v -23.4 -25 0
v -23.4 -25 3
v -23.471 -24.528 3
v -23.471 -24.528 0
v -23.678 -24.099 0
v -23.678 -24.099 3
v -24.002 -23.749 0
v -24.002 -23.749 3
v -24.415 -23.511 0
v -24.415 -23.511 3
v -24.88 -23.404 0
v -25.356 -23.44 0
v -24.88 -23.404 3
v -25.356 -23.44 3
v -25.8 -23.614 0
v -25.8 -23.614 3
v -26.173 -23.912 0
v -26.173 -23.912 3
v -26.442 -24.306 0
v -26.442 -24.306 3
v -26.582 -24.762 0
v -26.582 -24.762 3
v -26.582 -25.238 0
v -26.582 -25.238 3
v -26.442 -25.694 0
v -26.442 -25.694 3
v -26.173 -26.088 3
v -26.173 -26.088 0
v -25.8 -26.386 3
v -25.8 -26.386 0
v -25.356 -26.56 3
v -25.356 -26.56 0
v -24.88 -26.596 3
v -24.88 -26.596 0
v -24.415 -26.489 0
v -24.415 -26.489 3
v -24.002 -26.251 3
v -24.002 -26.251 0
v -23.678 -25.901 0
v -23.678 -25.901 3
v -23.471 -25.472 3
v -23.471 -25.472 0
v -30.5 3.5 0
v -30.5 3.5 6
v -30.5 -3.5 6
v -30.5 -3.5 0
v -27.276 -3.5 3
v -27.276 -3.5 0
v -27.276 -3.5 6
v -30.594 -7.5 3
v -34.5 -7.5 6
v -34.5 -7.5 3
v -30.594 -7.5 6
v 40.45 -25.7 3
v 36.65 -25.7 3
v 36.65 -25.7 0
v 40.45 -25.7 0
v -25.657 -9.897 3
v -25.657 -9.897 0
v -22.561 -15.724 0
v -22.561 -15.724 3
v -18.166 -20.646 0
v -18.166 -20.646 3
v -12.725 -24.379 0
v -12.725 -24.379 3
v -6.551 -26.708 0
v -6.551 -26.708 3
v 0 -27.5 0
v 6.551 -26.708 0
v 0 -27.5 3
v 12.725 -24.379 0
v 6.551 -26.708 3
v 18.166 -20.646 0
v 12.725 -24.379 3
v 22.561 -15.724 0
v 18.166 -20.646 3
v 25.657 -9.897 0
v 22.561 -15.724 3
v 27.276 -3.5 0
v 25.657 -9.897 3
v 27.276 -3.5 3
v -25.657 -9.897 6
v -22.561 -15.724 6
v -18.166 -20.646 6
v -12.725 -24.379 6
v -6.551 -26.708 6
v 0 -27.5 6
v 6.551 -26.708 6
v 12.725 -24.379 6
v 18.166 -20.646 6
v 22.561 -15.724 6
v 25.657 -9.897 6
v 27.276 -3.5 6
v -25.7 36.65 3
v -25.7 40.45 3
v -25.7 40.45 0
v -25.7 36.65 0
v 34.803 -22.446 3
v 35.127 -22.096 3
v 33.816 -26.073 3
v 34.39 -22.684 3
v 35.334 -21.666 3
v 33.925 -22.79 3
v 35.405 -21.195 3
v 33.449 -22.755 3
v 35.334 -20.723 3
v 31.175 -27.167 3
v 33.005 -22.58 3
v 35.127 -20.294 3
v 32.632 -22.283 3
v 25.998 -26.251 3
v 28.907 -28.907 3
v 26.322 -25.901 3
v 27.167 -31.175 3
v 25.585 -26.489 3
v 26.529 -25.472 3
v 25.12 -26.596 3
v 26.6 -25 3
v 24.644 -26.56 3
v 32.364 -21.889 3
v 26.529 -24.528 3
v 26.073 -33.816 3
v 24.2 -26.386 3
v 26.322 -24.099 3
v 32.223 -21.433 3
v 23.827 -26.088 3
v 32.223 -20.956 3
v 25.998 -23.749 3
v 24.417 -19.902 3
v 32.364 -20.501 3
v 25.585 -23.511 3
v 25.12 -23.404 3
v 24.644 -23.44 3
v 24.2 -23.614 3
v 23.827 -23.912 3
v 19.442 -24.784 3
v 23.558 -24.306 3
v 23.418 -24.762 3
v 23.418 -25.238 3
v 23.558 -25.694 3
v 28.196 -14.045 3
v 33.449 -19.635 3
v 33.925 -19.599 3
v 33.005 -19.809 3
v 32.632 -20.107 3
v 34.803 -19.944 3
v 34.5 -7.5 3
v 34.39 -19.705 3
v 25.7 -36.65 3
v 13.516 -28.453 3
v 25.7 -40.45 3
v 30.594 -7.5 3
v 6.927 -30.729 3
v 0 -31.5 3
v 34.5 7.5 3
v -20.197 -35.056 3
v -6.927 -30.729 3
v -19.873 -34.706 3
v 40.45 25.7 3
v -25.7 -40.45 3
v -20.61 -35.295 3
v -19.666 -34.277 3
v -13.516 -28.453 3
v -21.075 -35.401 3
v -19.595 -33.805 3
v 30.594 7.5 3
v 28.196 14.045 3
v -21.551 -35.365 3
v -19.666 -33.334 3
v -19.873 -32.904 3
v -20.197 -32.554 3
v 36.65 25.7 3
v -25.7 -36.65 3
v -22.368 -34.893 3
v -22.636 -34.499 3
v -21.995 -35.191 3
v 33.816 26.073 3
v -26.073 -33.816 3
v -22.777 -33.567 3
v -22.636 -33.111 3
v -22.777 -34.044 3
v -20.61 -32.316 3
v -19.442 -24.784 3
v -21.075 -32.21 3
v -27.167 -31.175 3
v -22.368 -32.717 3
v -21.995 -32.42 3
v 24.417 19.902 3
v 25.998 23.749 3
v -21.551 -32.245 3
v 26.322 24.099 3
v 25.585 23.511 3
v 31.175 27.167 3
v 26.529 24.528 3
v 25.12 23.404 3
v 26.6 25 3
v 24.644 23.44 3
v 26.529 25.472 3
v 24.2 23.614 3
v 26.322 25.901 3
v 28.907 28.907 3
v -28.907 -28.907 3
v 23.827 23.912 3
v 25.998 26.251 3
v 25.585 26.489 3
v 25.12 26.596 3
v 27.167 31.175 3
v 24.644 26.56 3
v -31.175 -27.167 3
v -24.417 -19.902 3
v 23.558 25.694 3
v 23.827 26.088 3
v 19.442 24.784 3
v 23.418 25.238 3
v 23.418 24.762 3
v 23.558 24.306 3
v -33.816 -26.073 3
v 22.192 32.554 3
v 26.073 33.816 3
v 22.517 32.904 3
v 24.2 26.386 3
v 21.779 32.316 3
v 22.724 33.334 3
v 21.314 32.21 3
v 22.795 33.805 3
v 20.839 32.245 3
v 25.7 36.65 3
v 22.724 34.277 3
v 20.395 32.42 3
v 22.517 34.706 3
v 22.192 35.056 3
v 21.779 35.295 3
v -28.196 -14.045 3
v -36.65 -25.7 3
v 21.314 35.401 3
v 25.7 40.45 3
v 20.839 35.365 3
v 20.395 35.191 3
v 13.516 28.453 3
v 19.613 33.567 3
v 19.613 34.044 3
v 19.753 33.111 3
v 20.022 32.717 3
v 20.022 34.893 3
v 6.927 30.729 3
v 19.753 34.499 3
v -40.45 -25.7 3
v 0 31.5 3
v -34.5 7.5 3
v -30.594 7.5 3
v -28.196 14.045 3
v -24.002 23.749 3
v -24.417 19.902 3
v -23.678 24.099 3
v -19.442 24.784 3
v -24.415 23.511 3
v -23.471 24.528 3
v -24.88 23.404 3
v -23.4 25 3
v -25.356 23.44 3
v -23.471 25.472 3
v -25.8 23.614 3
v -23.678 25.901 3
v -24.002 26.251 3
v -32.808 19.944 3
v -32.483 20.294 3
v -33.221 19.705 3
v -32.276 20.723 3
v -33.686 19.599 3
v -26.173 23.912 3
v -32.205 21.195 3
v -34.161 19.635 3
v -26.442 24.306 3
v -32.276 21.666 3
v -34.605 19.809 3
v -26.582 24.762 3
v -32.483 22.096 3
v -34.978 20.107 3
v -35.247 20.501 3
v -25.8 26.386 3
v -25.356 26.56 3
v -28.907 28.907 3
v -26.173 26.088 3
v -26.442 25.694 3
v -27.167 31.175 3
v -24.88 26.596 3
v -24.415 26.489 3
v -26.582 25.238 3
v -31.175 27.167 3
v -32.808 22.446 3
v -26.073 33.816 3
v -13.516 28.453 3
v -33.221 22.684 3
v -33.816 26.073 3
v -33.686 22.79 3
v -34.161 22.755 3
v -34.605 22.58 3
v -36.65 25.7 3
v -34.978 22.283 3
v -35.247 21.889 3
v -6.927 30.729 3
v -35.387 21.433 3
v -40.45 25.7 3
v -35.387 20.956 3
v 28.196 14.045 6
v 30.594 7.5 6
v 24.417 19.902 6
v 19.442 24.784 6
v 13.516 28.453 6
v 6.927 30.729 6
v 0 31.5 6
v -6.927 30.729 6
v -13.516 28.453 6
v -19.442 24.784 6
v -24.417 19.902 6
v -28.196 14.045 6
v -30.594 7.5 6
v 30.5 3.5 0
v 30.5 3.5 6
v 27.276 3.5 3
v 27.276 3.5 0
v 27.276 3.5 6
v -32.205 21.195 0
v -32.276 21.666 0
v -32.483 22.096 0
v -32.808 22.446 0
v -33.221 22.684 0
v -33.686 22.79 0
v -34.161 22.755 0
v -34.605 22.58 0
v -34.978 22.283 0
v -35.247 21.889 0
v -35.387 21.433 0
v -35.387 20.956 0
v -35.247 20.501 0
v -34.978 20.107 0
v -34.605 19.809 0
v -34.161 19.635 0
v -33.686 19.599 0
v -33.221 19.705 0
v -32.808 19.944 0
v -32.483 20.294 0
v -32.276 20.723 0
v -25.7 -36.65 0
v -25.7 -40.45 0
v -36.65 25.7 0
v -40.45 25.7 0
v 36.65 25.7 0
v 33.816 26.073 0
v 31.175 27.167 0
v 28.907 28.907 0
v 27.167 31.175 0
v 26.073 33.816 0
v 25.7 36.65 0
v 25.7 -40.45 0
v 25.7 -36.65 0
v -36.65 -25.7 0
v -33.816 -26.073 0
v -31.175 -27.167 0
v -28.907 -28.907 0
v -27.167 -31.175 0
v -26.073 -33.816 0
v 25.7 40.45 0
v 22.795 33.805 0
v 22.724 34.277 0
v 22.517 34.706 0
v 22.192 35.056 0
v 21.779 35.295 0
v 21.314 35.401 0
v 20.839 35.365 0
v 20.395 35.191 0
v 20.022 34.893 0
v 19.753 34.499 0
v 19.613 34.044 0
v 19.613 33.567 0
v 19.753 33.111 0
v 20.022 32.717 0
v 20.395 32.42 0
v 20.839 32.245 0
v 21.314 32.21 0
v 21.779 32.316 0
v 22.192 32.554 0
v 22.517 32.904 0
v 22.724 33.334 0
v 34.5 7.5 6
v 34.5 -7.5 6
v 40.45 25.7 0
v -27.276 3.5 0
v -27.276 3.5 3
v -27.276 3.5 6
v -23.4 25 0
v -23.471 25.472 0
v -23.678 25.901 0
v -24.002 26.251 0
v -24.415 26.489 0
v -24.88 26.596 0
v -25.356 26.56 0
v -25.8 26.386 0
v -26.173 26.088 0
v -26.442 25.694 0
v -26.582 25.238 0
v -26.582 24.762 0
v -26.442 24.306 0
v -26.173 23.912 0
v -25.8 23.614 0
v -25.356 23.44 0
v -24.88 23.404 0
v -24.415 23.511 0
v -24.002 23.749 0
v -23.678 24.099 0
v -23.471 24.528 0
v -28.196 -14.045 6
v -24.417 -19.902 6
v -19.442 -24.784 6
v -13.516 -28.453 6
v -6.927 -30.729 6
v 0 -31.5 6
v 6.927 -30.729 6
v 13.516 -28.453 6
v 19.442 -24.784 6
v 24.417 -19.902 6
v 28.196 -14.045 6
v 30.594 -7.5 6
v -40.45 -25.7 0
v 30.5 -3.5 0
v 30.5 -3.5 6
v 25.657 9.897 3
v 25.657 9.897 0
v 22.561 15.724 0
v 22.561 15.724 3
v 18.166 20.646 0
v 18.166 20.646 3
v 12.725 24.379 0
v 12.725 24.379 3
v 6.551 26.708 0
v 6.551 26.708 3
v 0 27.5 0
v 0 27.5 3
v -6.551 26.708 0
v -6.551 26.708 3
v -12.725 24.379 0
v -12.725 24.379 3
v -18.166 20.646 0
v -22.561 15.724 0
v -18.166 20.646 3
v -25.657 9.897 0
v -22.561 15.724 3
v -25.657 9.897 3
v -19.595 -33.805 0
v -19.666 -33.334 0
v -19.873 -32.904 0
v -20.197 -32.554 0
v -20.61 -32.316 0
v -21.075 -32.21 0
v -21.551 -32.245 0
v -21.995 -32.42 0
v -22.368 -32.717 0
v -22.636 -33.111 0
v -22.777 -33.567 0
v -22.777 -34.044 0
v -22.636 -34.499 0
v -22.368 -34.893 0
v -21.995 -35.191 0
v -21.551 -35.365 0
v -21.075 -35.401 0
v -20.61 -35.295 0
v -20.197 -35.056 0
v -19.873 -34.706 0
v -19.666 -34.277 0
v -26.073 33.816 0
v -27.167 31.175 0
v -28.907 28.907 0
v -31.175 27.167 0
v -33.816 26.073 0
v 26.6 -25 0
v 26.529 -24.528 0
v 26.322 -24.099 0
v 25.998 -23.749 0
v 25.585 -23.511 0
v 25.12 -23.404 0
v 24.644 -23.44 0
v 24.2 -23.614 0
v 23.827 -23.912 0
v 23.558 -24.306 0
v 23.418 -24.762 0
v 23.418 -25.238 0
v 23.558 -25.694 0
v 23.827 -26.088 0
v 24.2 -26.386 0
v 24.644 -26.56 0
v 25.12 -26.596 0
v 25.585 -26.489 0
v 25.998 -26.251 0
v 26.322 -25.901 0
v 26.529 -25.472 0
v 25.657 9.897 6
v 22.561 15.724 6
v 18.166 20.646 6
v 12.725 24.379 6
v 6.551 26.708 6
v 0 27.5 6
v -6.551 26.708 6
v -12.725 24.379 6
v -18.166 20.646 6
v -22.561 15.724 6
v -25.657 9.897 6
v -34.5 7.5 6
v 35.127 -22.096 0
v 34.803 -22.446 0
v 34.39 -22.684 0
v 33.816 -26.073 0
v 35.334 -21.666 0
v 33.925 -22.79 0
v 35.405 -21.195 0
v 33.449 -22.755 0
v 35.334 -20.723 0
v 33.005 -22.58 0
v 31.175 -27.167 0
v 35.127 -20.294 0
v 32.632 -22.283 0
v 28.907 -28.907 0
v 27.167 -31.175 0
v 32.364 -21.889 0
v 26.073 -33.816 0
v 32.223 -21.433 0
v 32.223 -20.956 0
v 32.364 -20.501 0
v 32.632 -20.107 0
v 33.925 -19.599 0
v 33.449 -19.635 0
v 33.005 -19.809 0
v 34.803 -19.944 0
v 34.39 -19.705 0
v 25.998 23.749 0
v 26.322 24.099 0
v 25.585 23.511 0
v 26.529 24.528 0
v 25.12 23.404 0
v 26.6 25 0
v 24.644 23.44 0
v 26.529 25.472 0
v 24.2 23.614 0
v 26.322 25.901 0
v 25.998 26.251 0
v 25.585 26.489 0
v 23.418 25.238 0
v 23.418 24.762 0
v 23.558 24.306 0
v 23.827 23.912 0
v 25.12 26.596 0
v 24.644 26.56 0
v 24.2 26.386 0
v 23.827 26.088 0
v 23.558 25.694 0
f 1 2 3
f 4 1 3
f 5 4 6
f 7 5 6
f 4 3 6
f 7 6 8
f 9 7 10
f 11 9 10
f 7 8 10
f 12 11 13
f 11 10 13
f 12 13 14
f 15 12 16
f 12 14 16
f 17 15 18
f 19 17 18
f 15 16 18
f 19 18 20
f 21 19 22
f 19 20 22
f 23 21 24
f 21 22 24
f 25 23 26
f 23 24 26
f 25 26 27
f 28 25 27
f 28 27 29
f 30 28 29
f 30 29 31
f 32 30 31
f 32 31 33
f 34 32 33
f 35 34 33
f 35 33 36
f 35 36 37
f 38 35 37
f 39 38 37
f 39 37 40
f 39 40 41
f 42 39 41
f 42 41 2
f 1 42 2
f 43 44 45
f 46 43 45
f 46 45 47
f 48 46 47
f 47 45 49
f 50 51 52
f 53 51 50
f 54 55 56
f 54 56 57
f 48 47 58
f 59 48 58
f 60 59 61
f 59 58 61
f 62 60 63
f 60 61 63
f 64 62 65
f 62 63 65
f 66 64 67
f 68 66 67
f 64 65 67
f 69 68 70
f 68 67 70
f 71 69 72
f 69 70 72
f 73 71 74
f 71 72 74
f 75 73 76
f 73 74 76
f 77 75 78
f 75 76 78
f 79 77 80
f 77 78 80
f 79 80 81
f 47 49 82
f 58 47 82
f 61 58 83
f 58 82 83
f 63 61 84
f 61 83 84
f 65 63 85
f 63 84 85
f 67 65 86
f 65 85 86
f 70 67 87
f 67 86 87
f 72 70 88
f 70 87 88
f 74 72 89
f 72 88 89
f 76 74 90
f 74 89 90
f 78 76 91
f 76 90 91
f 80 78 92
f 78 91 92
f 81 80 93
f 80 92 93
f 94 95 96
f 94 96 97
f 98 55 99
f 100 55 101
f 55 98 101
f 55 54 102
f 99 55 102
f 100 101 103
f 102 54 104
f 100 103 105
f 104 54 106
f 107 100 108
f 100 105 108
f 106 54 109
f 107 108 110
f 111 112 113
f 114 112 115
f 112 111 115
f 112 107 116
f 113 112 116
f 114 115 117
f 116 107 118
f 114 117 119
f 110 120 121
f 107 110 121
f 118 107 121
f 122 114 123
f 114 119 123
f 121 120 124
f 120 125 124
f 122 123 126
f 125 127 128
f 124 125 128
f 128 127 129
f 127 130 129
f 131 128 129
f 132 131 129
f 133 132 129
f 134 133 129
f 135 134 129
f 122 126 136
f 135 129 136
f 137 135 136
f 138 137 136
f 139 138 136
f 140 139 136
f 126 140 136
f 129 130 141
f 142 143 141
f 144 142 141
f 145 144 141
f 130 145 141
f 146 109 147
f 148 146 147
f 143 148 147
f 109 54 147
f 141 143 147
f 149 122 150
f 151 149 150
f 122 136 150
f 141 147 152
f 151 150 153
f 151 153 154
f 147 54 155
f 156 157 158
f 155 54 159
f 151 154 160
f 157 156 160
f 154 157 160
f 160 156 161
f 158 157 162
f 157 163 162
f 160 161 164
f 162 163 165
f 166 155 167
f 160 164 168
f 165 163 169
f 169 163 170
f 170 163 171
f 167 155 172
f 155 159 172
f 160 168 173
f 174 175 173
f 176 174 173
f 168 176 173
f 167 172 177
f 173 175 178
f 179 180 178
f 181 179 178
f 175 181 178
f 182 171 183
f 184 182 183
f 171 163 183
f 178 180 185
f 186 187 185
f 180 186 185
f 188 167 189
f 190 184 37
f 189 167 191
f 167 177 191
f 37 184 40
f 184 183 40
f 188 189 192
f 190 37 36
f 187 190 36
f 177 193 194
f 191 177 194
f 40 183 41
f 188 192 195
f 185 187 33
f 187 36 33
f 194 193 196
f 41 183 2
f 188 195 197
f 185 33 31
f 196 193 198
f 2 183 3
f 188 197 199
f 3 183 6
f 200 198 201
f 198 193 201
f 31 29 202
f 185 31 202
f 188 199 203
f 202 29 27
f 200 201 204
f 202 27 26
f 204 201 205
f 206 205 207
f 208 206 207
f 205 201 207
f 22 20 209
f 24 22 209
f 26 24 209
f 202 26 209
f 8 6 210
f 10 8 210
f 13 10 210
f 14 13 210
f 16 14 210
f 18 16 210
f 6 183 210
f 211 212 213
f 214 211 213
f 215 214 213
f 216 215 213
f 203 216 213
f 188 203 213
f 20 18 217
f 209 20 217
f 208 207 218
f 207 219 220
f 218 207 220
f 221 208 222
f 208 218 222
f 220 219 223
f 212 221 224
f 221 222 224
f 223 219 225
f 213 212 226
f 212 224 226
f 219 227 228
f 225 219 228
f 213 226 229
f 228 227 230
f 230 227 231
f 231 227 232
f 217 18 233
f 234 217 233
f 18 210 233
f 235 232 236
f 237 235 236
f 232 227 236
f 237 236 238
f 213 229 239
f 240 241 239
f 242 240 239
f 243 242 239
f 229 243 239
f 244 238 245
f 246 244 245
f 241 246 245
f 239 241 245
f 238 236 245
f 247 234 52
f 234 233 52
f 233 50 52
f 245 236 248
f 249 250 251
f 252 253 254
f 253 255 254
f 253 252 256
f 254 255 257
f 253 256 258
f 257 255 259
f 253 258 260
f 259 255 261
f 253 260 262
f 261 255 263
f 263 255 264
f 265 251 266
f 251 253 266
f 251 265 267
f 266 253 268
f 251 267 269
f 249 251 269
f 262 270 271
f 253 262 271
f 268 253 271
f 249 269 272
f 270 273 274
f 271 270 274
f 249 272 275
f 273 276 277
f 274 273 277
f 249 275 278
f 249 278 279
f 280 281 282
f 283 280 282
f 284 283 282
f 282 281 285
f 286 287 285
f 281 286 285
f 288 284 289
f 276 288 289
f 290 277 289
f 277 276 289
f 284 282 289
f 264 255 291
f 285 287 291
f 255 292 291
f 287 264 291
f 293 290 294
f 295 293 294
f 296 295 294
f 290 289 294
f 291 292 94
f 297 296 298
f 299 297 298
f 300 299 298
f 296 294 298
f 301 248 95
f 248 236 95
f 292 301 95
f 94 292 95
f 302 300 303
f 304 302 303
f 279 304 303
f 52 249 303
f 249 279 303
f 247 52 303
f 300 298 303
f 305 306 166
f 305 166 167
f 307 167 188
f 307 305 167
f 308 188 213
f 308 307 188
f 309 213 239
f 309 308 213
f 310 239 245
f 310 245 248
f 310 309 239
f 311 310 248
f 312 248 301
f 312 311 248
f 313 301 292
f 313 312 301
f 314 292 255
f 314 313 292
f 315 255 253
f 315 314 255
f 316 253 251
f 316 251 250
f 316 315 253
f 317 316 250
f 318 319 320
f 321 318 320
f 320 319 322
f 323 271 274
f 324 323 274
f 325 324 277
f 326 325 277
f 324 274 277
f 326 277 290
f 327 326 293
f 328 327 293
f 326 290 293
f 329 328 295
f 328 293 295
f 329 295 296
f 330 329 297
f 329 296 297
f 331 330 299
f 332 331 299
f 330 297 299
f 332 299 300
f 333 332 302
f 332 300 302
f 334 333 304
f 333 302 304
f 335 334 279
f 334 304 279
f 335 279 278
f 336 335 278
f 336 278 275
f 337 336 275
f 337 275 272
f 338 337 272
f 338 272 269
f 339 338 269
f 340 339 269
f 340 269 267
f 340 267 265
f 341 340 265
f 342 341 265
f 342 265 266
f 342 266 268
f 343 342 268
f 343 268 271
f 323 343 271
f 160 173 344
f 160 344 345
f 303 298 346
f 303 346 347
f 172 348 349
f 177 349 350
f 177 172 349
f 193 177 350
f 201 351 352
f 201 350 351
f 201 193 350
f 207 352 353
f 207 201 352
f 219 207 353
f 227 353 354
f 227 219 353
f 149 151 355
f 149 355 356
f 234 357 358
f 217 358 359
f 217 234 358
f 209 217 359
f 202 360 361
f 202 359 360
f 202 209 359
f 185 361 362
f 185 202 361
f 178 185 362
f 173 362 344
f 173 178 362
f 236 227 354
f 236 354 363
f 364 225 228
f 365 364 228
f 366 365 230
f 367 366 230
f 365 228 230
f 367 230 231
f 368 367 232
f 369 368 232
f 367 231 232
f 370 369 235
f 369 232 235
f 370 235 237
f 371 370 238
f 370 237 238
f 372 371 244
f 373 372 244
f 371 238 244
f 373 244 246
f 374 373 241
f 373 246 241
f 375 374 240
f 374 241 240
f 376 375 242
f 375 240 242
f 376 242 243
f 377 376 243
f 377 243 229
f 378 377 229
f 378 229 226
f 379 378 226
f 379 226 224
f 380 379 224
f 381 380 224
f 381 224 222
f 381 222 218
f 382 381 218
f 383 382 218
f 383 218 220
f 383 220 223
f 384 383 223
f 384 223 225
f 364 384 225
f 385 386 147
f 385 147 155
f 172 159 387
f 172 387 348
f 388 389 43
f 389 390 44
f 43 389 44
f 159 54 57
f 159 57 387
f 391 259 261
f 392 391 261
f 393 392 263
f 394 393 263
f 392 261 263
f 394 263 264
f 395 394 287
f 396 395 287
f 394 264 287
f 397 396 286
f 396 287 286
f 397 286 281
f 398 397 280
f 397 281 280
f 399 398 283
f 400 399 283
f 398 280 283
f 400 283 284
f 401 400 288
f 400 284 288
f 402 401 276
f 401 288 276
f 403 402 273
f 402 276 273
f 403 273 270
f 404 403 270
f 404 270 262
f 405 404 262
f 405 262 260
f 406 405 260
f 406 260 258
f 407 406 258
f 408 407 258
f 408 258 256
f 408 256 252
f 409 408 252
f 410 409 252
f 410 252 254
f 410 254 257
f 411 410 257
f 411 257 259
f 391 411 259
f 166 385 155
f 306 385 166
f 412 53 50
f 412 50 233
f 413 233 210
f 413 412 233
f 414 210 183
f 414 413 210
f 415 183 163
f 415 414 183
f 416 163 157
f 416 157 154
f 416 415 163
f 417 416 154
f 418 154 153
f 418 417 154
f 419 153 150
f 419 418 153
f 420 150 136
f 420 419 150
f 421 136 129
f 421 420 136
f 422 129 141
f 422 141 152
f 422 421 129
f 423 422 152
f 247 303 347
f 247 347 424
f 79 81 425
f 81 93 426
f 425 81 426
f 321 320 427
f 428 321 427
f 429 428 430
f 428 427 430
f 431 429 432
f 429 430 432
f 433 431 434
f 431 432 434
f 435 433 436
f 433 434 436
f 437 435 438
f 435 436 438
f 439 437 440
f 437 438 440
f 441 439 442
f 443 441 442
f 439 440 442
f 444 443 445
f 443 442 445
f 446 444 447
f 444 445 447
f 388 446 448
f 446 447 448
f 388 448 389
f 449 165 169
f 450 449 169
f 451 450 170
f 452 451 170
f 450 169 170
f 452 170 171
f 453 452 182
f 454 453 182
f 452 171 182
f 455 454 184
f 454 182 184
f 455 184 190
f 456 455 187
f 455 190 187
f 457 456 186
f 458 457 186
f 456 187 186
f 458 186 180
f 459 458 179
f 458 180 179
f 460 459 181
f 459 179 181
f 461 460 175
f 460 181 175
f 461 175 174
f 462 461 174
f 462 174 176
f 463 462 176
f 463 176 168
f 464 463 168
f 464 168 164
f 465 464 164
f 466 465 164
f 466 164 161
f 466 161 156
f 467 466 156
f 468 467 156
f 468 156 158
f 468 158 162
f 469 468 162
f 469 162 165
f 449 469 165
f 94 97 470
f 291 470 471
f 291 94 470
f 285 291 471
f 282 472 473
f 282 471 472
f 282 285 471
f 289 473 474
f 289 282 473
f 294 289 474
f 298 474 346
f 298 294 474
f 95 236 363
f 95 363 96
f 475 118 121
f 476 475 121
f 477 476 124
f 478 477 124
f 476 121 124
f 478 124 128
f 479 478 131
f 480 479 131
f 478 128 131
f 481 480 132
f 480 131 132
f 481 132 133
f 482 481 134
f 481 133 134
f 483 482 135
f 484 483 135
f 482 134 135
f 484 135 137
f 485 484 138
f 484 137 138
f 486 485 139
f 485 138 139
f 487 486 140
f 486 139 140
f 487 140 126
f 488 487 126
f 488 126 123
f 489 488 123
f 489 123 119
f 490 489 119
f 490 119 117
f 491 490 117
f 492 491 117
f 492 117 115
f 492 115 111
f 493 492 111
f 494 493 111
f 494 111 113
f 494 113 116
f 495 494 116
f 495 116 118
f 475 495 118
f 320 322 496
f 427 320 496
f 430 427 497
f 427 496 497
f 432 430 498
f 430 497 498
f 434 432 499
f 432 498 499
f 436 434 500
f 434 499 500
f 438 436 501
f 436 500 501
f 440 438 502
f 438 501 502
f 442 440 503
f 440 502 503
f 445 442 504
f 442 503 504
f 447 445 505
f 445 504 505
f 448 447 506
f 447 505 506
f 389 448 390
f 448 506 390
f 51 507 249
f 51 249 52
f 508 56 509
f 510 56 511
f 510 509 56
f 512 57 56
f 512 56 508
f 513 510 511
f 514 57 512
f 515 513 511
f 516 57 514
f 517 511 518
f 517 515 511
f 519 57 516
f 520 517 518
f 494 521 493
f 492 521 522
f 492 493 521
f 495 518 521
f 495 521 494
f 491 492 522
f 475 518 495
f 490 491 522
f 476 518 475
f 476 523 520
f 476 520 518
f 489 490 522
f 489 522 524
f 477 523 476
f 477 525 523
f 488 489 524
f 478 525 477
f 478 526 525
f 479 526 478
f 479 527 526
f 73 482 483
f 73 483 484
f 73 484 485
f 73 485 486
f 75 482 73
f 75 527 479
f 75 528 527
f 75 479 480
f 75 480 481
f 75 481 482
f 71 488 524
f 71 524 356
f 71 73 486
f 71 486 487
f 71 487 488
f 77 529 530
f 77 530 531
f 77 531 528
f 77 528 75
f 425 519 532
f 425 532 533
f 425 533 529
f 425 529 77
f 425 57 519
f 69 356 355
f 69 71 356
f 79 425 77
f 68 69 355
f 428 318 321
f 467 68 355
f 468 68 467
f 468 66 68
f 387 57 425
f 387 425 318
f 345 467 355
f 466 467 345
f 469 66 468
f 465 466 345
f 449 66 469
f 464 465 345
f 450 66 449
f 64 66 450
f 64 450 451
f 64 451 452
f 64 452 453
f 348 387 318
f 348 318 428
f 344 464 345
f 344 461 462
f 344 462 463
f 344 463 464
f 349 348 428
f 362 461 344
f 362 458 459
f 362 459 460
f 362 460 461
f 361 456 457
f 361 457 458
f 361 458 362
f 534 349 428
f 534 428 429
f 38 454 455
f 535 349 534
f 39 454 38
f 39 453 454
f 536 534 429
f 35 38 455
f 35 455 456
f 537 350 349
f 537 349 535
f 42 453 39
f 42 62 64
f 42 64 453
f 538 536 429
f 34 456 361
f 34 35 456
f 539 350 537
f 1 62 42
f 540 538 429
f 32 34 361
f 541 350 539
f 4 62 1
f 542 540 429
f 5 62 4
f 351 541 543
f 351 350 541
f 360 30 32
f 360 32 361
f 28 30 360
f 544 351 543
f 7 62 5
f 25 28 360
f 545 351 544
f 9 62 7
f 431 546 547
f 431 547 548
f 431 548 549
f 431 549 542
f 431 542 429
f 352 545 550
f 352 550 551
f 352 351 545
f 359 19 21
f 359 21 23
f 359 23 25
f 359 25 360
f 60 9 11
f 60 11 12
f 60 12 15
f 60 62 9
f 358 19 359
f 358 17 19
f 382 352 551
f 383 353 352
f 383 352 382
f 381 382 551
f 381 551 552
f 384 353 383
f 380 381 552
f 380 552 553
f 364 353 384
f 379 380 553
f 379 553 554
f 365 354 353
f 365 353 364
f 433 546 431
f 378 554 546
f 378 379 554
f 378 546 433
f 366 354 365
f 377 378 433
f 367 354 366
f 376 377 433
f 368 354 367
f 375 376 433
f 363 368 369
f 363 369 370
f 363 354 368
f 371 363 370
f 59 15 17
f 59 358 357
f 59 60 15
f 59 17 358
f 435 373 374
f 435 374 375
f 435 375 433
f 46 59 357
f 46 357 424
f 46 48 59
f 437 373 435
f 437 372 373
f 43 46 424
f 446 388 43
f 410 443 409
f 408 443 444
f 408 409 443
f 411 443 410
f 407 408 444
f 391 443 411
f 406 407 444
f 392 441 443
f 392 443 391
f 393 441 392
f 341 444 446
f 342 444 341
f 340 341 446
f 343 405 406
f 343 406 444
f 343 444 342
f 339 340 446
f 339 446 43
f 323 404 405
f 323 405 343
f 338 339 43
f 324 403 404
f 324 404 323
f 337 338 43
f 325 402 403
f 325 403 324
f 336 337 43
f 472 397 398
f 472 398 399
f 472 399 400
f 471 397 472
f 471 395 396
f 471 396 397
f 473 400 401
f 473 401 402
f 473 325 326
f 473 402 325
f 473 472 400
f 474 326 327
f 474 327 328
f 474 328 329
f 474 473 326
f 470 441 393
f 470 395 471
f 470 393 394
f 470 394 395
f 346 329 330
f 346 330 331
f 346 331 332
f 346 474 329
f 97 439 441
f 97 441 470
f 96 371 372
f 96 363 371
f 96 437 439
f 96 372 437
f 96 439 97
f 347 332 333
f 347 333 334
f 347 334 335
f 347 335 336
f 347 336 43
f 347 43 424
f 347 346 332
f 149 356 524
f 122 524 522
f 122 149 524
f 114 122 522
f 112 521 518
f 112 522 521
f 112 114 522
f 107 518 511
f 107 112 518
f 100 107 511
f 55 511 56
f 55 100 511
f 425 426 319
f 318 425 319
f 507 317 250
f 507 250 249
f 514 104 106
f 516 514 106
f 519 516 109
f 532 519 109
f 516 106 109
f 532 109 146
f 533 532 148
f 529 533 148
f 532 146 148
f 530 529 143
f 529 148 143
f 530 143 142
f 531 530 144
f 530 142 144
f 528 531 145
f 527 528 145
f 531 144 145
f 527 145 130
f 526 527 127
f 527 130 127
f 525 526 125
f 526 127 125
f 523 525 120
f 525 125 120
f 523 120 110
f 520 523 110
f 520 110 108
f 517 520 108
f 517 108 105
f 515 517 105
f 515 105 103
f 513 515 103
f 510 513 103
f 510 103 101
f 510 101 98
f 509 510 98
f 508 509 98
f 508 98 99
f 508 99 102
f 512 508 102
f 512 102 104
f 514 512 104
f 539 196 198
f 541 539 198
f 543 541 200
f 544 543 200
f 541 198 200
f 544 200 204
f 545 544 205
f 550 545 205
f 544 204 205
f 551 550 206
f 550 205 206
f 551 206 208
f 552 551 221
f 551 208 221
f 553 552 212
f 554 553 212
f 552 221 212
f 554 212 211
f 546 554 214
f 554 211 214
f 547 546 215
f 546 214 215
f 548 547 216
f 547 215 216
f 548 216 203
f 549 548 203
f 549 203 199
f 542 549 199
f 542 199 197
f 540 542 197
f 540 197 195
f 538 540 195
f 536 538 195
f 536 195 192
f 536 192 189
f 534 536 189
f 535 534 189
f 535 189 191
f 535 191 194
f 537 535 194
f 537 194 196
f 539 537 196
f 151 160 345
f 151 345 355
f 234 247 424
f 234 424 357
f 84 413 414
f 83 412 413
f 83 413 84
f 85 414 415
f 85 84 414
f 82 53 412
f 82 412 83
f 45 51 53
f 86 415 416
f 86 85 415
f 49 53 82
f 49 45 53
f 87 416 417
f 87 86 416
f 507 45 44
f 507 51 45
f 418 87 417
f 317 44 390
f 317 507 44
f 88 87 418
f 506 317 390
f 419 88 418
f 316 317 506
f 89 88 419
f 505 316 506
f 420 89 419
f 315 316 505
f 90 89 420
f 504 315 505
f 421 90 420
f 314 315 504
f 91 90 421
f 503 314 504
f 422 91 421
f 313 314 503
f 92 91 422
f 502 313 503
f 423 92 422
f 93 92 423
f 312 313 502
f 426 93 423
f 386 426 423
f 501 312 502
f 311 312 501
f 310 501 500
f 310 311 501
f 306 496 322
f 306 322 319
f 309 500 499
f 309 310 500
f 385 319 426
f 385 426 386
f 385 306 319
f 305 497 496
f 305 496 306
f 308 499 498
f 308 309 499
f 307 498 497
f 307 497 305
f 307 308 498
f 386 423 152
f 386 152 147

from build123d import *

# Parameters (mm, degrees)
EXTRUDE_1_DEPTH     = 3
CUT_EXTRUDE_2_DEPTH = 62.238264182
SKETCH_7_R          = 1.6
SKETCH_7_R_2        = 27.5
CUT_EXTRUDE_3_DEPTH = 58.283549122
SKETCH_2_R          = 1.6
CUT_EXTRUDE_4_DEPTH = 58.283549122
SKETCH_8_W          = 61
SKETCH_8_H          = 7
CUT_EXTRUDE_5_DEPTH = 58.283549122
EXTRUDE_START       = 3
EXTRUDE_2_DEPTH     = 3


with BuildPart() as part:
    # 草图1 → 凸台-拉伸1 (new body)
    with BuildSketch(Plane.XY):
        with BuildLine():
            Line((-27.5, 43.25), (27.5, 43.25))
            ThreePointArc((27.5, 43.25), (28.207106781, 42.957106781), (28.5, 42.25))
            Line((28.5, 42.25), (28.5, 36.65))
            ThreePointArc((28.5, 36.65), (30.887079733, 30.887079733), (36.65, 28.5))
            Line((36.65, 28.5), (42.25, 28.5))
            ThreePointArc((42.25, 28.5), (42.957106781, 28.207106781), (43.25, 27.5))
            Line((43.25, 27.5), (43.25, -27.5))
            ThreePointArc((43.25, -27.5), (42.957106781, -28.207106781), (42.25, -28.5))
            Line((42.25, -28.5), (36.65, -28.5))
            ThreePointArc((36.65, -28.5), (30.887079733, -30.887079733), (28.5, -36.65))
            Line((28.5, -36.65), (28.5, -42.25))
            ThreePointArc((28.5, -42.25), (28.207106781, -42.957106781), (27.5, -43.25))
            Line((27.5, -43.25), (-27.5, -43.25))
            ThreePointArc((-27.5, -43.25), (-28.207106781, -42.957106781), (-28.5, -42.25))
            Line((-28.5, -42.25), (-28.5, -36.65))
            ThreePointArc((-28.5, -36.65), (-30.887079733, -30.887079733), (-36.65, -28.5))
            Line((-36.65, -28.5), (-42.25, -28.5))
            ThreePointArc((-42.25, -28.5), (-42.957106781, -28.207106781), (-43.25, -27.5))
            Line((-43.25, -27.5), (-43.25, 27.5))
            ThreePointArc((-43.25, 27.5), (-42.957106781, 28.207106781), (-42.25, 28.5))
            Line((-42.25, 28.5), (-36.65, 28.5))
            ThreePointArc((-36.65, 28.5), (-30.887079733, 30.887079733), (-28.5, 36.65))
            Line((-28.5, 36.65), (-28.5, 42.25))
            ThreePointArc((-28.5, 42.25), (-28.207106781, 42.957106781), (-27.5, 43.25))
        make_face()
    extrude(amount=EXTRUDE_1_DEPTH)

    # 草图6 → 切除-拉伸2 (cut, through all)
    with BuildSketch(Plane.XY.offset(3)):
        with BuildLine():
            Line((-28.5, 42.25), (-28.5, 36.65))
            ThreePointArc((-28.5, 36.65), (-30.887079733, 30.887079733), (-36.65, 28.5))
            Line((-36.65, 28.5), (-42.25, 28.5))
            ThreePointArc((-42.25, 28.5), (-42.957106781, 28.207106781), (-43.25, 27.5))
            Line((-43.25, 27.5), (-43.25, -27.5))
            ThreePointArc((-43.25, -27.5), (-42.957106781, -28.207106781), (-42.25, -28.5))
            Line((-42.25, -28.5), (-36.65, -28.5))
            ThreePointArc((-36.65, -28.5), (-30.887079733, -30.887079733), (-28.5, -36.65))
            Line((-28.5, -36.65), (-28.5, -42.25))
            ThreePointArc((-28.5, -42.25), (-28.207106781, -42.957106781), (-27.5, -43.25))
            Line((-27.5, -43.25), (27.5, -43.25))
            ThreePointArc((27.5, -43.25), (28.207106781, -42.957106781), (28.5, -42.25))
            Line((28.5, -42.25), (28.5, -36.65))
            ThreePointArc((28.5, -36.65), (30.887079733, -30.887079733), (36.65, -28.5))
            Line((36.65, -28.5), (42.25, -28.5))
            ThreePointArc((42.25, -28.5), (42.957106781, -28.207106781), (43.25, -27.5))
            Line((43.25, -27.5), (43.25, 27.5))
            ThreePointArc((43.25, 27.5), (42.957106781, 28.207106781), (42.25, 28.5))
            Line((42.25, 28.5), (36.65, 28.5))
            ThreePointArc((36.65, 28.5), (30.887079733, 30.887079733), (28.5, 36.65))
            Line((28.5, 36.65), (28.5, 42.25))
            ThreePointArc((28.5, 42.25), (28.207106781, 42.957106781), (27.5, 43.25))
            Line((27.5, 43.25), (-27.5, 43.25))
            ThreePointArc((-27.5, 43.25), (-28.207106781, 42.957106781), (-28.5, 42.25))
        make_face()
        with BuildLine():
            Line((-25.7, 40.45), (-25.7, 36.65))
            ThreePointArc((-25.7, 36.65), (-28.907180746, 28.907180746), (-36.65, 25.7))
            Line((-36.65, 25.7), (-40.45, 25.7))
            Line((-40.45, 25.7), (-40.45, -25.7))
            Line((-40.45, -25.7), (-36.65, -25.7))
            ThreePointArc((-36.65, -25.7), (-28.907180746, -28.907180746), (-25.7, -36.65))
            Line((-25.7, -36.65), (-25.7, -40.45))
            Line((-25.7, -40.45), (25.7, -40.45))
            Line((25.7, -40.45), (25.7, -36.65))
            ThreePointArc((25.7, -36.65), (28.907180746, -28.907180746), (36.65, -25.7))
            Line((36.65, -25.7), (40.45, -25.7))
            Line((40.45, -25.7), (40.45, 25.7))
            Line((40.45, 25.7), (36.65, 25.7))
            ThreePointArc((36.65, 25.7), (28.907180746, 28.907180746), (25.7, 36.65))
            Line((25.7, 36.65), (25.7, 40.45))
            Line((25.7, 40.45), (-25.7, 40.45))
        make_face(mode=Mode.SUBTRACT)
    extrude(amount=-CUT_EXTRUDE_2_DEPTH, mode=Mode.SUBTRACT)

    # 草图7 → 切除-拉伸3 (cut, through all)
    with BuildSketch(Plane.XY.offset(3)):
        with Locations((-25, 25)):
            Circle(SKETCH_7_R)
        with Locations((25, 25)):
            Circle(SKETCH_7_R)
        with Locations((25, -25)):
            Circle(SKETCH_7_R)
        with Locations((-25, -25)):
            Circle(SKETCH_7_R)
        Circle(SKETCH_7_R_2)
    extrude(amount=-CUT_EXTRUDE_3_DEPTH, mode=Mode.SUBTRACT)

    # 草图2 → 切除-拉伸4 (cut, through all)
    with BuildSketch(Plane.XY.offset(3)):
        with Locations((-33.80515662, 21.19484338)):
            Circle(SKETCH_2_R)
        with Locations((21.19484338, 33.80515662)):
            Circle(SKETCH_2_R)
        with Locations((33.80515662, -21.19484338)):
            Circle(SKETCH_2_R)
        with Locations((-21.19484338, -33.80515662)):
            Circle(SKETCH_2_R)
    extrude(amount=-CUT_EXTRUDE_4_DEPTH, mode=Mode.SUBTRACT)

    # 草图8 → 切除-拉伸5 (cut, through all)
    with BuildSketch(Plane.XY.offset(3)):
        Rectangle(SKETCH_8_W, SKETCH_8_H)
    extrude(amount=-CUT_EXTRUDE_5_DEPTH, mode=Mode.SUBTRACT)

    # 草图9 → 凸台-拉伸2 (add)
    with BuildSketch(Plane.XY.offset(3).offset(EXTRUDE_START)):
        with BuildLine():
            Line((-34.5, -7.5), (-30.594117082, -7.5))
            ThreePointArc((-30.594117082, -7.5), (0, -31.5), (30.594117082, -7.5))
            Line((30.594117082, -7.5), (34.5, -7.5))
            Line((34.5, -7.5), (34.5, 7.5))
            Line((34.5, 7.5), (30.594117082, 7.5))
            ThreePointArc((30.594117082, 7.5), (0, 31.5), (-30.594117082, 7.5))
            Line((-30.594117082, 7.5), (-34.5, 7.5))
            Line((-34.5, 7.5), (-34.5, -7.5))
        make_face()
        with BuildLine():
            Line((-30.5, -3.5), (-27.276363394, -3.5))
            ThreePointArc((-27.276363394, -3.5), (0, -27.5), (27.276363394, -3.5))
            Line((27.276363394, -3.5), (30.5, -3.5))
            Line((30.5, -3.5), (30.5, 3.5))
            Line((30.5, 3.5), (27.276363394, 3.5))
            ThreePointArc((27.276363394, 3.5), (0, 27.5), (-27.276363394, 3.5))
            Line((-27.276363394, 3.5), (-30.5, 3.5))
            Line((-30.5, 3.5), (-30.5, -3.5))
        make_face(mode=Mode.SUBTRACT)
    extrude(amount=-EXTRUDE_2_DEPTH)


solid = part.part
